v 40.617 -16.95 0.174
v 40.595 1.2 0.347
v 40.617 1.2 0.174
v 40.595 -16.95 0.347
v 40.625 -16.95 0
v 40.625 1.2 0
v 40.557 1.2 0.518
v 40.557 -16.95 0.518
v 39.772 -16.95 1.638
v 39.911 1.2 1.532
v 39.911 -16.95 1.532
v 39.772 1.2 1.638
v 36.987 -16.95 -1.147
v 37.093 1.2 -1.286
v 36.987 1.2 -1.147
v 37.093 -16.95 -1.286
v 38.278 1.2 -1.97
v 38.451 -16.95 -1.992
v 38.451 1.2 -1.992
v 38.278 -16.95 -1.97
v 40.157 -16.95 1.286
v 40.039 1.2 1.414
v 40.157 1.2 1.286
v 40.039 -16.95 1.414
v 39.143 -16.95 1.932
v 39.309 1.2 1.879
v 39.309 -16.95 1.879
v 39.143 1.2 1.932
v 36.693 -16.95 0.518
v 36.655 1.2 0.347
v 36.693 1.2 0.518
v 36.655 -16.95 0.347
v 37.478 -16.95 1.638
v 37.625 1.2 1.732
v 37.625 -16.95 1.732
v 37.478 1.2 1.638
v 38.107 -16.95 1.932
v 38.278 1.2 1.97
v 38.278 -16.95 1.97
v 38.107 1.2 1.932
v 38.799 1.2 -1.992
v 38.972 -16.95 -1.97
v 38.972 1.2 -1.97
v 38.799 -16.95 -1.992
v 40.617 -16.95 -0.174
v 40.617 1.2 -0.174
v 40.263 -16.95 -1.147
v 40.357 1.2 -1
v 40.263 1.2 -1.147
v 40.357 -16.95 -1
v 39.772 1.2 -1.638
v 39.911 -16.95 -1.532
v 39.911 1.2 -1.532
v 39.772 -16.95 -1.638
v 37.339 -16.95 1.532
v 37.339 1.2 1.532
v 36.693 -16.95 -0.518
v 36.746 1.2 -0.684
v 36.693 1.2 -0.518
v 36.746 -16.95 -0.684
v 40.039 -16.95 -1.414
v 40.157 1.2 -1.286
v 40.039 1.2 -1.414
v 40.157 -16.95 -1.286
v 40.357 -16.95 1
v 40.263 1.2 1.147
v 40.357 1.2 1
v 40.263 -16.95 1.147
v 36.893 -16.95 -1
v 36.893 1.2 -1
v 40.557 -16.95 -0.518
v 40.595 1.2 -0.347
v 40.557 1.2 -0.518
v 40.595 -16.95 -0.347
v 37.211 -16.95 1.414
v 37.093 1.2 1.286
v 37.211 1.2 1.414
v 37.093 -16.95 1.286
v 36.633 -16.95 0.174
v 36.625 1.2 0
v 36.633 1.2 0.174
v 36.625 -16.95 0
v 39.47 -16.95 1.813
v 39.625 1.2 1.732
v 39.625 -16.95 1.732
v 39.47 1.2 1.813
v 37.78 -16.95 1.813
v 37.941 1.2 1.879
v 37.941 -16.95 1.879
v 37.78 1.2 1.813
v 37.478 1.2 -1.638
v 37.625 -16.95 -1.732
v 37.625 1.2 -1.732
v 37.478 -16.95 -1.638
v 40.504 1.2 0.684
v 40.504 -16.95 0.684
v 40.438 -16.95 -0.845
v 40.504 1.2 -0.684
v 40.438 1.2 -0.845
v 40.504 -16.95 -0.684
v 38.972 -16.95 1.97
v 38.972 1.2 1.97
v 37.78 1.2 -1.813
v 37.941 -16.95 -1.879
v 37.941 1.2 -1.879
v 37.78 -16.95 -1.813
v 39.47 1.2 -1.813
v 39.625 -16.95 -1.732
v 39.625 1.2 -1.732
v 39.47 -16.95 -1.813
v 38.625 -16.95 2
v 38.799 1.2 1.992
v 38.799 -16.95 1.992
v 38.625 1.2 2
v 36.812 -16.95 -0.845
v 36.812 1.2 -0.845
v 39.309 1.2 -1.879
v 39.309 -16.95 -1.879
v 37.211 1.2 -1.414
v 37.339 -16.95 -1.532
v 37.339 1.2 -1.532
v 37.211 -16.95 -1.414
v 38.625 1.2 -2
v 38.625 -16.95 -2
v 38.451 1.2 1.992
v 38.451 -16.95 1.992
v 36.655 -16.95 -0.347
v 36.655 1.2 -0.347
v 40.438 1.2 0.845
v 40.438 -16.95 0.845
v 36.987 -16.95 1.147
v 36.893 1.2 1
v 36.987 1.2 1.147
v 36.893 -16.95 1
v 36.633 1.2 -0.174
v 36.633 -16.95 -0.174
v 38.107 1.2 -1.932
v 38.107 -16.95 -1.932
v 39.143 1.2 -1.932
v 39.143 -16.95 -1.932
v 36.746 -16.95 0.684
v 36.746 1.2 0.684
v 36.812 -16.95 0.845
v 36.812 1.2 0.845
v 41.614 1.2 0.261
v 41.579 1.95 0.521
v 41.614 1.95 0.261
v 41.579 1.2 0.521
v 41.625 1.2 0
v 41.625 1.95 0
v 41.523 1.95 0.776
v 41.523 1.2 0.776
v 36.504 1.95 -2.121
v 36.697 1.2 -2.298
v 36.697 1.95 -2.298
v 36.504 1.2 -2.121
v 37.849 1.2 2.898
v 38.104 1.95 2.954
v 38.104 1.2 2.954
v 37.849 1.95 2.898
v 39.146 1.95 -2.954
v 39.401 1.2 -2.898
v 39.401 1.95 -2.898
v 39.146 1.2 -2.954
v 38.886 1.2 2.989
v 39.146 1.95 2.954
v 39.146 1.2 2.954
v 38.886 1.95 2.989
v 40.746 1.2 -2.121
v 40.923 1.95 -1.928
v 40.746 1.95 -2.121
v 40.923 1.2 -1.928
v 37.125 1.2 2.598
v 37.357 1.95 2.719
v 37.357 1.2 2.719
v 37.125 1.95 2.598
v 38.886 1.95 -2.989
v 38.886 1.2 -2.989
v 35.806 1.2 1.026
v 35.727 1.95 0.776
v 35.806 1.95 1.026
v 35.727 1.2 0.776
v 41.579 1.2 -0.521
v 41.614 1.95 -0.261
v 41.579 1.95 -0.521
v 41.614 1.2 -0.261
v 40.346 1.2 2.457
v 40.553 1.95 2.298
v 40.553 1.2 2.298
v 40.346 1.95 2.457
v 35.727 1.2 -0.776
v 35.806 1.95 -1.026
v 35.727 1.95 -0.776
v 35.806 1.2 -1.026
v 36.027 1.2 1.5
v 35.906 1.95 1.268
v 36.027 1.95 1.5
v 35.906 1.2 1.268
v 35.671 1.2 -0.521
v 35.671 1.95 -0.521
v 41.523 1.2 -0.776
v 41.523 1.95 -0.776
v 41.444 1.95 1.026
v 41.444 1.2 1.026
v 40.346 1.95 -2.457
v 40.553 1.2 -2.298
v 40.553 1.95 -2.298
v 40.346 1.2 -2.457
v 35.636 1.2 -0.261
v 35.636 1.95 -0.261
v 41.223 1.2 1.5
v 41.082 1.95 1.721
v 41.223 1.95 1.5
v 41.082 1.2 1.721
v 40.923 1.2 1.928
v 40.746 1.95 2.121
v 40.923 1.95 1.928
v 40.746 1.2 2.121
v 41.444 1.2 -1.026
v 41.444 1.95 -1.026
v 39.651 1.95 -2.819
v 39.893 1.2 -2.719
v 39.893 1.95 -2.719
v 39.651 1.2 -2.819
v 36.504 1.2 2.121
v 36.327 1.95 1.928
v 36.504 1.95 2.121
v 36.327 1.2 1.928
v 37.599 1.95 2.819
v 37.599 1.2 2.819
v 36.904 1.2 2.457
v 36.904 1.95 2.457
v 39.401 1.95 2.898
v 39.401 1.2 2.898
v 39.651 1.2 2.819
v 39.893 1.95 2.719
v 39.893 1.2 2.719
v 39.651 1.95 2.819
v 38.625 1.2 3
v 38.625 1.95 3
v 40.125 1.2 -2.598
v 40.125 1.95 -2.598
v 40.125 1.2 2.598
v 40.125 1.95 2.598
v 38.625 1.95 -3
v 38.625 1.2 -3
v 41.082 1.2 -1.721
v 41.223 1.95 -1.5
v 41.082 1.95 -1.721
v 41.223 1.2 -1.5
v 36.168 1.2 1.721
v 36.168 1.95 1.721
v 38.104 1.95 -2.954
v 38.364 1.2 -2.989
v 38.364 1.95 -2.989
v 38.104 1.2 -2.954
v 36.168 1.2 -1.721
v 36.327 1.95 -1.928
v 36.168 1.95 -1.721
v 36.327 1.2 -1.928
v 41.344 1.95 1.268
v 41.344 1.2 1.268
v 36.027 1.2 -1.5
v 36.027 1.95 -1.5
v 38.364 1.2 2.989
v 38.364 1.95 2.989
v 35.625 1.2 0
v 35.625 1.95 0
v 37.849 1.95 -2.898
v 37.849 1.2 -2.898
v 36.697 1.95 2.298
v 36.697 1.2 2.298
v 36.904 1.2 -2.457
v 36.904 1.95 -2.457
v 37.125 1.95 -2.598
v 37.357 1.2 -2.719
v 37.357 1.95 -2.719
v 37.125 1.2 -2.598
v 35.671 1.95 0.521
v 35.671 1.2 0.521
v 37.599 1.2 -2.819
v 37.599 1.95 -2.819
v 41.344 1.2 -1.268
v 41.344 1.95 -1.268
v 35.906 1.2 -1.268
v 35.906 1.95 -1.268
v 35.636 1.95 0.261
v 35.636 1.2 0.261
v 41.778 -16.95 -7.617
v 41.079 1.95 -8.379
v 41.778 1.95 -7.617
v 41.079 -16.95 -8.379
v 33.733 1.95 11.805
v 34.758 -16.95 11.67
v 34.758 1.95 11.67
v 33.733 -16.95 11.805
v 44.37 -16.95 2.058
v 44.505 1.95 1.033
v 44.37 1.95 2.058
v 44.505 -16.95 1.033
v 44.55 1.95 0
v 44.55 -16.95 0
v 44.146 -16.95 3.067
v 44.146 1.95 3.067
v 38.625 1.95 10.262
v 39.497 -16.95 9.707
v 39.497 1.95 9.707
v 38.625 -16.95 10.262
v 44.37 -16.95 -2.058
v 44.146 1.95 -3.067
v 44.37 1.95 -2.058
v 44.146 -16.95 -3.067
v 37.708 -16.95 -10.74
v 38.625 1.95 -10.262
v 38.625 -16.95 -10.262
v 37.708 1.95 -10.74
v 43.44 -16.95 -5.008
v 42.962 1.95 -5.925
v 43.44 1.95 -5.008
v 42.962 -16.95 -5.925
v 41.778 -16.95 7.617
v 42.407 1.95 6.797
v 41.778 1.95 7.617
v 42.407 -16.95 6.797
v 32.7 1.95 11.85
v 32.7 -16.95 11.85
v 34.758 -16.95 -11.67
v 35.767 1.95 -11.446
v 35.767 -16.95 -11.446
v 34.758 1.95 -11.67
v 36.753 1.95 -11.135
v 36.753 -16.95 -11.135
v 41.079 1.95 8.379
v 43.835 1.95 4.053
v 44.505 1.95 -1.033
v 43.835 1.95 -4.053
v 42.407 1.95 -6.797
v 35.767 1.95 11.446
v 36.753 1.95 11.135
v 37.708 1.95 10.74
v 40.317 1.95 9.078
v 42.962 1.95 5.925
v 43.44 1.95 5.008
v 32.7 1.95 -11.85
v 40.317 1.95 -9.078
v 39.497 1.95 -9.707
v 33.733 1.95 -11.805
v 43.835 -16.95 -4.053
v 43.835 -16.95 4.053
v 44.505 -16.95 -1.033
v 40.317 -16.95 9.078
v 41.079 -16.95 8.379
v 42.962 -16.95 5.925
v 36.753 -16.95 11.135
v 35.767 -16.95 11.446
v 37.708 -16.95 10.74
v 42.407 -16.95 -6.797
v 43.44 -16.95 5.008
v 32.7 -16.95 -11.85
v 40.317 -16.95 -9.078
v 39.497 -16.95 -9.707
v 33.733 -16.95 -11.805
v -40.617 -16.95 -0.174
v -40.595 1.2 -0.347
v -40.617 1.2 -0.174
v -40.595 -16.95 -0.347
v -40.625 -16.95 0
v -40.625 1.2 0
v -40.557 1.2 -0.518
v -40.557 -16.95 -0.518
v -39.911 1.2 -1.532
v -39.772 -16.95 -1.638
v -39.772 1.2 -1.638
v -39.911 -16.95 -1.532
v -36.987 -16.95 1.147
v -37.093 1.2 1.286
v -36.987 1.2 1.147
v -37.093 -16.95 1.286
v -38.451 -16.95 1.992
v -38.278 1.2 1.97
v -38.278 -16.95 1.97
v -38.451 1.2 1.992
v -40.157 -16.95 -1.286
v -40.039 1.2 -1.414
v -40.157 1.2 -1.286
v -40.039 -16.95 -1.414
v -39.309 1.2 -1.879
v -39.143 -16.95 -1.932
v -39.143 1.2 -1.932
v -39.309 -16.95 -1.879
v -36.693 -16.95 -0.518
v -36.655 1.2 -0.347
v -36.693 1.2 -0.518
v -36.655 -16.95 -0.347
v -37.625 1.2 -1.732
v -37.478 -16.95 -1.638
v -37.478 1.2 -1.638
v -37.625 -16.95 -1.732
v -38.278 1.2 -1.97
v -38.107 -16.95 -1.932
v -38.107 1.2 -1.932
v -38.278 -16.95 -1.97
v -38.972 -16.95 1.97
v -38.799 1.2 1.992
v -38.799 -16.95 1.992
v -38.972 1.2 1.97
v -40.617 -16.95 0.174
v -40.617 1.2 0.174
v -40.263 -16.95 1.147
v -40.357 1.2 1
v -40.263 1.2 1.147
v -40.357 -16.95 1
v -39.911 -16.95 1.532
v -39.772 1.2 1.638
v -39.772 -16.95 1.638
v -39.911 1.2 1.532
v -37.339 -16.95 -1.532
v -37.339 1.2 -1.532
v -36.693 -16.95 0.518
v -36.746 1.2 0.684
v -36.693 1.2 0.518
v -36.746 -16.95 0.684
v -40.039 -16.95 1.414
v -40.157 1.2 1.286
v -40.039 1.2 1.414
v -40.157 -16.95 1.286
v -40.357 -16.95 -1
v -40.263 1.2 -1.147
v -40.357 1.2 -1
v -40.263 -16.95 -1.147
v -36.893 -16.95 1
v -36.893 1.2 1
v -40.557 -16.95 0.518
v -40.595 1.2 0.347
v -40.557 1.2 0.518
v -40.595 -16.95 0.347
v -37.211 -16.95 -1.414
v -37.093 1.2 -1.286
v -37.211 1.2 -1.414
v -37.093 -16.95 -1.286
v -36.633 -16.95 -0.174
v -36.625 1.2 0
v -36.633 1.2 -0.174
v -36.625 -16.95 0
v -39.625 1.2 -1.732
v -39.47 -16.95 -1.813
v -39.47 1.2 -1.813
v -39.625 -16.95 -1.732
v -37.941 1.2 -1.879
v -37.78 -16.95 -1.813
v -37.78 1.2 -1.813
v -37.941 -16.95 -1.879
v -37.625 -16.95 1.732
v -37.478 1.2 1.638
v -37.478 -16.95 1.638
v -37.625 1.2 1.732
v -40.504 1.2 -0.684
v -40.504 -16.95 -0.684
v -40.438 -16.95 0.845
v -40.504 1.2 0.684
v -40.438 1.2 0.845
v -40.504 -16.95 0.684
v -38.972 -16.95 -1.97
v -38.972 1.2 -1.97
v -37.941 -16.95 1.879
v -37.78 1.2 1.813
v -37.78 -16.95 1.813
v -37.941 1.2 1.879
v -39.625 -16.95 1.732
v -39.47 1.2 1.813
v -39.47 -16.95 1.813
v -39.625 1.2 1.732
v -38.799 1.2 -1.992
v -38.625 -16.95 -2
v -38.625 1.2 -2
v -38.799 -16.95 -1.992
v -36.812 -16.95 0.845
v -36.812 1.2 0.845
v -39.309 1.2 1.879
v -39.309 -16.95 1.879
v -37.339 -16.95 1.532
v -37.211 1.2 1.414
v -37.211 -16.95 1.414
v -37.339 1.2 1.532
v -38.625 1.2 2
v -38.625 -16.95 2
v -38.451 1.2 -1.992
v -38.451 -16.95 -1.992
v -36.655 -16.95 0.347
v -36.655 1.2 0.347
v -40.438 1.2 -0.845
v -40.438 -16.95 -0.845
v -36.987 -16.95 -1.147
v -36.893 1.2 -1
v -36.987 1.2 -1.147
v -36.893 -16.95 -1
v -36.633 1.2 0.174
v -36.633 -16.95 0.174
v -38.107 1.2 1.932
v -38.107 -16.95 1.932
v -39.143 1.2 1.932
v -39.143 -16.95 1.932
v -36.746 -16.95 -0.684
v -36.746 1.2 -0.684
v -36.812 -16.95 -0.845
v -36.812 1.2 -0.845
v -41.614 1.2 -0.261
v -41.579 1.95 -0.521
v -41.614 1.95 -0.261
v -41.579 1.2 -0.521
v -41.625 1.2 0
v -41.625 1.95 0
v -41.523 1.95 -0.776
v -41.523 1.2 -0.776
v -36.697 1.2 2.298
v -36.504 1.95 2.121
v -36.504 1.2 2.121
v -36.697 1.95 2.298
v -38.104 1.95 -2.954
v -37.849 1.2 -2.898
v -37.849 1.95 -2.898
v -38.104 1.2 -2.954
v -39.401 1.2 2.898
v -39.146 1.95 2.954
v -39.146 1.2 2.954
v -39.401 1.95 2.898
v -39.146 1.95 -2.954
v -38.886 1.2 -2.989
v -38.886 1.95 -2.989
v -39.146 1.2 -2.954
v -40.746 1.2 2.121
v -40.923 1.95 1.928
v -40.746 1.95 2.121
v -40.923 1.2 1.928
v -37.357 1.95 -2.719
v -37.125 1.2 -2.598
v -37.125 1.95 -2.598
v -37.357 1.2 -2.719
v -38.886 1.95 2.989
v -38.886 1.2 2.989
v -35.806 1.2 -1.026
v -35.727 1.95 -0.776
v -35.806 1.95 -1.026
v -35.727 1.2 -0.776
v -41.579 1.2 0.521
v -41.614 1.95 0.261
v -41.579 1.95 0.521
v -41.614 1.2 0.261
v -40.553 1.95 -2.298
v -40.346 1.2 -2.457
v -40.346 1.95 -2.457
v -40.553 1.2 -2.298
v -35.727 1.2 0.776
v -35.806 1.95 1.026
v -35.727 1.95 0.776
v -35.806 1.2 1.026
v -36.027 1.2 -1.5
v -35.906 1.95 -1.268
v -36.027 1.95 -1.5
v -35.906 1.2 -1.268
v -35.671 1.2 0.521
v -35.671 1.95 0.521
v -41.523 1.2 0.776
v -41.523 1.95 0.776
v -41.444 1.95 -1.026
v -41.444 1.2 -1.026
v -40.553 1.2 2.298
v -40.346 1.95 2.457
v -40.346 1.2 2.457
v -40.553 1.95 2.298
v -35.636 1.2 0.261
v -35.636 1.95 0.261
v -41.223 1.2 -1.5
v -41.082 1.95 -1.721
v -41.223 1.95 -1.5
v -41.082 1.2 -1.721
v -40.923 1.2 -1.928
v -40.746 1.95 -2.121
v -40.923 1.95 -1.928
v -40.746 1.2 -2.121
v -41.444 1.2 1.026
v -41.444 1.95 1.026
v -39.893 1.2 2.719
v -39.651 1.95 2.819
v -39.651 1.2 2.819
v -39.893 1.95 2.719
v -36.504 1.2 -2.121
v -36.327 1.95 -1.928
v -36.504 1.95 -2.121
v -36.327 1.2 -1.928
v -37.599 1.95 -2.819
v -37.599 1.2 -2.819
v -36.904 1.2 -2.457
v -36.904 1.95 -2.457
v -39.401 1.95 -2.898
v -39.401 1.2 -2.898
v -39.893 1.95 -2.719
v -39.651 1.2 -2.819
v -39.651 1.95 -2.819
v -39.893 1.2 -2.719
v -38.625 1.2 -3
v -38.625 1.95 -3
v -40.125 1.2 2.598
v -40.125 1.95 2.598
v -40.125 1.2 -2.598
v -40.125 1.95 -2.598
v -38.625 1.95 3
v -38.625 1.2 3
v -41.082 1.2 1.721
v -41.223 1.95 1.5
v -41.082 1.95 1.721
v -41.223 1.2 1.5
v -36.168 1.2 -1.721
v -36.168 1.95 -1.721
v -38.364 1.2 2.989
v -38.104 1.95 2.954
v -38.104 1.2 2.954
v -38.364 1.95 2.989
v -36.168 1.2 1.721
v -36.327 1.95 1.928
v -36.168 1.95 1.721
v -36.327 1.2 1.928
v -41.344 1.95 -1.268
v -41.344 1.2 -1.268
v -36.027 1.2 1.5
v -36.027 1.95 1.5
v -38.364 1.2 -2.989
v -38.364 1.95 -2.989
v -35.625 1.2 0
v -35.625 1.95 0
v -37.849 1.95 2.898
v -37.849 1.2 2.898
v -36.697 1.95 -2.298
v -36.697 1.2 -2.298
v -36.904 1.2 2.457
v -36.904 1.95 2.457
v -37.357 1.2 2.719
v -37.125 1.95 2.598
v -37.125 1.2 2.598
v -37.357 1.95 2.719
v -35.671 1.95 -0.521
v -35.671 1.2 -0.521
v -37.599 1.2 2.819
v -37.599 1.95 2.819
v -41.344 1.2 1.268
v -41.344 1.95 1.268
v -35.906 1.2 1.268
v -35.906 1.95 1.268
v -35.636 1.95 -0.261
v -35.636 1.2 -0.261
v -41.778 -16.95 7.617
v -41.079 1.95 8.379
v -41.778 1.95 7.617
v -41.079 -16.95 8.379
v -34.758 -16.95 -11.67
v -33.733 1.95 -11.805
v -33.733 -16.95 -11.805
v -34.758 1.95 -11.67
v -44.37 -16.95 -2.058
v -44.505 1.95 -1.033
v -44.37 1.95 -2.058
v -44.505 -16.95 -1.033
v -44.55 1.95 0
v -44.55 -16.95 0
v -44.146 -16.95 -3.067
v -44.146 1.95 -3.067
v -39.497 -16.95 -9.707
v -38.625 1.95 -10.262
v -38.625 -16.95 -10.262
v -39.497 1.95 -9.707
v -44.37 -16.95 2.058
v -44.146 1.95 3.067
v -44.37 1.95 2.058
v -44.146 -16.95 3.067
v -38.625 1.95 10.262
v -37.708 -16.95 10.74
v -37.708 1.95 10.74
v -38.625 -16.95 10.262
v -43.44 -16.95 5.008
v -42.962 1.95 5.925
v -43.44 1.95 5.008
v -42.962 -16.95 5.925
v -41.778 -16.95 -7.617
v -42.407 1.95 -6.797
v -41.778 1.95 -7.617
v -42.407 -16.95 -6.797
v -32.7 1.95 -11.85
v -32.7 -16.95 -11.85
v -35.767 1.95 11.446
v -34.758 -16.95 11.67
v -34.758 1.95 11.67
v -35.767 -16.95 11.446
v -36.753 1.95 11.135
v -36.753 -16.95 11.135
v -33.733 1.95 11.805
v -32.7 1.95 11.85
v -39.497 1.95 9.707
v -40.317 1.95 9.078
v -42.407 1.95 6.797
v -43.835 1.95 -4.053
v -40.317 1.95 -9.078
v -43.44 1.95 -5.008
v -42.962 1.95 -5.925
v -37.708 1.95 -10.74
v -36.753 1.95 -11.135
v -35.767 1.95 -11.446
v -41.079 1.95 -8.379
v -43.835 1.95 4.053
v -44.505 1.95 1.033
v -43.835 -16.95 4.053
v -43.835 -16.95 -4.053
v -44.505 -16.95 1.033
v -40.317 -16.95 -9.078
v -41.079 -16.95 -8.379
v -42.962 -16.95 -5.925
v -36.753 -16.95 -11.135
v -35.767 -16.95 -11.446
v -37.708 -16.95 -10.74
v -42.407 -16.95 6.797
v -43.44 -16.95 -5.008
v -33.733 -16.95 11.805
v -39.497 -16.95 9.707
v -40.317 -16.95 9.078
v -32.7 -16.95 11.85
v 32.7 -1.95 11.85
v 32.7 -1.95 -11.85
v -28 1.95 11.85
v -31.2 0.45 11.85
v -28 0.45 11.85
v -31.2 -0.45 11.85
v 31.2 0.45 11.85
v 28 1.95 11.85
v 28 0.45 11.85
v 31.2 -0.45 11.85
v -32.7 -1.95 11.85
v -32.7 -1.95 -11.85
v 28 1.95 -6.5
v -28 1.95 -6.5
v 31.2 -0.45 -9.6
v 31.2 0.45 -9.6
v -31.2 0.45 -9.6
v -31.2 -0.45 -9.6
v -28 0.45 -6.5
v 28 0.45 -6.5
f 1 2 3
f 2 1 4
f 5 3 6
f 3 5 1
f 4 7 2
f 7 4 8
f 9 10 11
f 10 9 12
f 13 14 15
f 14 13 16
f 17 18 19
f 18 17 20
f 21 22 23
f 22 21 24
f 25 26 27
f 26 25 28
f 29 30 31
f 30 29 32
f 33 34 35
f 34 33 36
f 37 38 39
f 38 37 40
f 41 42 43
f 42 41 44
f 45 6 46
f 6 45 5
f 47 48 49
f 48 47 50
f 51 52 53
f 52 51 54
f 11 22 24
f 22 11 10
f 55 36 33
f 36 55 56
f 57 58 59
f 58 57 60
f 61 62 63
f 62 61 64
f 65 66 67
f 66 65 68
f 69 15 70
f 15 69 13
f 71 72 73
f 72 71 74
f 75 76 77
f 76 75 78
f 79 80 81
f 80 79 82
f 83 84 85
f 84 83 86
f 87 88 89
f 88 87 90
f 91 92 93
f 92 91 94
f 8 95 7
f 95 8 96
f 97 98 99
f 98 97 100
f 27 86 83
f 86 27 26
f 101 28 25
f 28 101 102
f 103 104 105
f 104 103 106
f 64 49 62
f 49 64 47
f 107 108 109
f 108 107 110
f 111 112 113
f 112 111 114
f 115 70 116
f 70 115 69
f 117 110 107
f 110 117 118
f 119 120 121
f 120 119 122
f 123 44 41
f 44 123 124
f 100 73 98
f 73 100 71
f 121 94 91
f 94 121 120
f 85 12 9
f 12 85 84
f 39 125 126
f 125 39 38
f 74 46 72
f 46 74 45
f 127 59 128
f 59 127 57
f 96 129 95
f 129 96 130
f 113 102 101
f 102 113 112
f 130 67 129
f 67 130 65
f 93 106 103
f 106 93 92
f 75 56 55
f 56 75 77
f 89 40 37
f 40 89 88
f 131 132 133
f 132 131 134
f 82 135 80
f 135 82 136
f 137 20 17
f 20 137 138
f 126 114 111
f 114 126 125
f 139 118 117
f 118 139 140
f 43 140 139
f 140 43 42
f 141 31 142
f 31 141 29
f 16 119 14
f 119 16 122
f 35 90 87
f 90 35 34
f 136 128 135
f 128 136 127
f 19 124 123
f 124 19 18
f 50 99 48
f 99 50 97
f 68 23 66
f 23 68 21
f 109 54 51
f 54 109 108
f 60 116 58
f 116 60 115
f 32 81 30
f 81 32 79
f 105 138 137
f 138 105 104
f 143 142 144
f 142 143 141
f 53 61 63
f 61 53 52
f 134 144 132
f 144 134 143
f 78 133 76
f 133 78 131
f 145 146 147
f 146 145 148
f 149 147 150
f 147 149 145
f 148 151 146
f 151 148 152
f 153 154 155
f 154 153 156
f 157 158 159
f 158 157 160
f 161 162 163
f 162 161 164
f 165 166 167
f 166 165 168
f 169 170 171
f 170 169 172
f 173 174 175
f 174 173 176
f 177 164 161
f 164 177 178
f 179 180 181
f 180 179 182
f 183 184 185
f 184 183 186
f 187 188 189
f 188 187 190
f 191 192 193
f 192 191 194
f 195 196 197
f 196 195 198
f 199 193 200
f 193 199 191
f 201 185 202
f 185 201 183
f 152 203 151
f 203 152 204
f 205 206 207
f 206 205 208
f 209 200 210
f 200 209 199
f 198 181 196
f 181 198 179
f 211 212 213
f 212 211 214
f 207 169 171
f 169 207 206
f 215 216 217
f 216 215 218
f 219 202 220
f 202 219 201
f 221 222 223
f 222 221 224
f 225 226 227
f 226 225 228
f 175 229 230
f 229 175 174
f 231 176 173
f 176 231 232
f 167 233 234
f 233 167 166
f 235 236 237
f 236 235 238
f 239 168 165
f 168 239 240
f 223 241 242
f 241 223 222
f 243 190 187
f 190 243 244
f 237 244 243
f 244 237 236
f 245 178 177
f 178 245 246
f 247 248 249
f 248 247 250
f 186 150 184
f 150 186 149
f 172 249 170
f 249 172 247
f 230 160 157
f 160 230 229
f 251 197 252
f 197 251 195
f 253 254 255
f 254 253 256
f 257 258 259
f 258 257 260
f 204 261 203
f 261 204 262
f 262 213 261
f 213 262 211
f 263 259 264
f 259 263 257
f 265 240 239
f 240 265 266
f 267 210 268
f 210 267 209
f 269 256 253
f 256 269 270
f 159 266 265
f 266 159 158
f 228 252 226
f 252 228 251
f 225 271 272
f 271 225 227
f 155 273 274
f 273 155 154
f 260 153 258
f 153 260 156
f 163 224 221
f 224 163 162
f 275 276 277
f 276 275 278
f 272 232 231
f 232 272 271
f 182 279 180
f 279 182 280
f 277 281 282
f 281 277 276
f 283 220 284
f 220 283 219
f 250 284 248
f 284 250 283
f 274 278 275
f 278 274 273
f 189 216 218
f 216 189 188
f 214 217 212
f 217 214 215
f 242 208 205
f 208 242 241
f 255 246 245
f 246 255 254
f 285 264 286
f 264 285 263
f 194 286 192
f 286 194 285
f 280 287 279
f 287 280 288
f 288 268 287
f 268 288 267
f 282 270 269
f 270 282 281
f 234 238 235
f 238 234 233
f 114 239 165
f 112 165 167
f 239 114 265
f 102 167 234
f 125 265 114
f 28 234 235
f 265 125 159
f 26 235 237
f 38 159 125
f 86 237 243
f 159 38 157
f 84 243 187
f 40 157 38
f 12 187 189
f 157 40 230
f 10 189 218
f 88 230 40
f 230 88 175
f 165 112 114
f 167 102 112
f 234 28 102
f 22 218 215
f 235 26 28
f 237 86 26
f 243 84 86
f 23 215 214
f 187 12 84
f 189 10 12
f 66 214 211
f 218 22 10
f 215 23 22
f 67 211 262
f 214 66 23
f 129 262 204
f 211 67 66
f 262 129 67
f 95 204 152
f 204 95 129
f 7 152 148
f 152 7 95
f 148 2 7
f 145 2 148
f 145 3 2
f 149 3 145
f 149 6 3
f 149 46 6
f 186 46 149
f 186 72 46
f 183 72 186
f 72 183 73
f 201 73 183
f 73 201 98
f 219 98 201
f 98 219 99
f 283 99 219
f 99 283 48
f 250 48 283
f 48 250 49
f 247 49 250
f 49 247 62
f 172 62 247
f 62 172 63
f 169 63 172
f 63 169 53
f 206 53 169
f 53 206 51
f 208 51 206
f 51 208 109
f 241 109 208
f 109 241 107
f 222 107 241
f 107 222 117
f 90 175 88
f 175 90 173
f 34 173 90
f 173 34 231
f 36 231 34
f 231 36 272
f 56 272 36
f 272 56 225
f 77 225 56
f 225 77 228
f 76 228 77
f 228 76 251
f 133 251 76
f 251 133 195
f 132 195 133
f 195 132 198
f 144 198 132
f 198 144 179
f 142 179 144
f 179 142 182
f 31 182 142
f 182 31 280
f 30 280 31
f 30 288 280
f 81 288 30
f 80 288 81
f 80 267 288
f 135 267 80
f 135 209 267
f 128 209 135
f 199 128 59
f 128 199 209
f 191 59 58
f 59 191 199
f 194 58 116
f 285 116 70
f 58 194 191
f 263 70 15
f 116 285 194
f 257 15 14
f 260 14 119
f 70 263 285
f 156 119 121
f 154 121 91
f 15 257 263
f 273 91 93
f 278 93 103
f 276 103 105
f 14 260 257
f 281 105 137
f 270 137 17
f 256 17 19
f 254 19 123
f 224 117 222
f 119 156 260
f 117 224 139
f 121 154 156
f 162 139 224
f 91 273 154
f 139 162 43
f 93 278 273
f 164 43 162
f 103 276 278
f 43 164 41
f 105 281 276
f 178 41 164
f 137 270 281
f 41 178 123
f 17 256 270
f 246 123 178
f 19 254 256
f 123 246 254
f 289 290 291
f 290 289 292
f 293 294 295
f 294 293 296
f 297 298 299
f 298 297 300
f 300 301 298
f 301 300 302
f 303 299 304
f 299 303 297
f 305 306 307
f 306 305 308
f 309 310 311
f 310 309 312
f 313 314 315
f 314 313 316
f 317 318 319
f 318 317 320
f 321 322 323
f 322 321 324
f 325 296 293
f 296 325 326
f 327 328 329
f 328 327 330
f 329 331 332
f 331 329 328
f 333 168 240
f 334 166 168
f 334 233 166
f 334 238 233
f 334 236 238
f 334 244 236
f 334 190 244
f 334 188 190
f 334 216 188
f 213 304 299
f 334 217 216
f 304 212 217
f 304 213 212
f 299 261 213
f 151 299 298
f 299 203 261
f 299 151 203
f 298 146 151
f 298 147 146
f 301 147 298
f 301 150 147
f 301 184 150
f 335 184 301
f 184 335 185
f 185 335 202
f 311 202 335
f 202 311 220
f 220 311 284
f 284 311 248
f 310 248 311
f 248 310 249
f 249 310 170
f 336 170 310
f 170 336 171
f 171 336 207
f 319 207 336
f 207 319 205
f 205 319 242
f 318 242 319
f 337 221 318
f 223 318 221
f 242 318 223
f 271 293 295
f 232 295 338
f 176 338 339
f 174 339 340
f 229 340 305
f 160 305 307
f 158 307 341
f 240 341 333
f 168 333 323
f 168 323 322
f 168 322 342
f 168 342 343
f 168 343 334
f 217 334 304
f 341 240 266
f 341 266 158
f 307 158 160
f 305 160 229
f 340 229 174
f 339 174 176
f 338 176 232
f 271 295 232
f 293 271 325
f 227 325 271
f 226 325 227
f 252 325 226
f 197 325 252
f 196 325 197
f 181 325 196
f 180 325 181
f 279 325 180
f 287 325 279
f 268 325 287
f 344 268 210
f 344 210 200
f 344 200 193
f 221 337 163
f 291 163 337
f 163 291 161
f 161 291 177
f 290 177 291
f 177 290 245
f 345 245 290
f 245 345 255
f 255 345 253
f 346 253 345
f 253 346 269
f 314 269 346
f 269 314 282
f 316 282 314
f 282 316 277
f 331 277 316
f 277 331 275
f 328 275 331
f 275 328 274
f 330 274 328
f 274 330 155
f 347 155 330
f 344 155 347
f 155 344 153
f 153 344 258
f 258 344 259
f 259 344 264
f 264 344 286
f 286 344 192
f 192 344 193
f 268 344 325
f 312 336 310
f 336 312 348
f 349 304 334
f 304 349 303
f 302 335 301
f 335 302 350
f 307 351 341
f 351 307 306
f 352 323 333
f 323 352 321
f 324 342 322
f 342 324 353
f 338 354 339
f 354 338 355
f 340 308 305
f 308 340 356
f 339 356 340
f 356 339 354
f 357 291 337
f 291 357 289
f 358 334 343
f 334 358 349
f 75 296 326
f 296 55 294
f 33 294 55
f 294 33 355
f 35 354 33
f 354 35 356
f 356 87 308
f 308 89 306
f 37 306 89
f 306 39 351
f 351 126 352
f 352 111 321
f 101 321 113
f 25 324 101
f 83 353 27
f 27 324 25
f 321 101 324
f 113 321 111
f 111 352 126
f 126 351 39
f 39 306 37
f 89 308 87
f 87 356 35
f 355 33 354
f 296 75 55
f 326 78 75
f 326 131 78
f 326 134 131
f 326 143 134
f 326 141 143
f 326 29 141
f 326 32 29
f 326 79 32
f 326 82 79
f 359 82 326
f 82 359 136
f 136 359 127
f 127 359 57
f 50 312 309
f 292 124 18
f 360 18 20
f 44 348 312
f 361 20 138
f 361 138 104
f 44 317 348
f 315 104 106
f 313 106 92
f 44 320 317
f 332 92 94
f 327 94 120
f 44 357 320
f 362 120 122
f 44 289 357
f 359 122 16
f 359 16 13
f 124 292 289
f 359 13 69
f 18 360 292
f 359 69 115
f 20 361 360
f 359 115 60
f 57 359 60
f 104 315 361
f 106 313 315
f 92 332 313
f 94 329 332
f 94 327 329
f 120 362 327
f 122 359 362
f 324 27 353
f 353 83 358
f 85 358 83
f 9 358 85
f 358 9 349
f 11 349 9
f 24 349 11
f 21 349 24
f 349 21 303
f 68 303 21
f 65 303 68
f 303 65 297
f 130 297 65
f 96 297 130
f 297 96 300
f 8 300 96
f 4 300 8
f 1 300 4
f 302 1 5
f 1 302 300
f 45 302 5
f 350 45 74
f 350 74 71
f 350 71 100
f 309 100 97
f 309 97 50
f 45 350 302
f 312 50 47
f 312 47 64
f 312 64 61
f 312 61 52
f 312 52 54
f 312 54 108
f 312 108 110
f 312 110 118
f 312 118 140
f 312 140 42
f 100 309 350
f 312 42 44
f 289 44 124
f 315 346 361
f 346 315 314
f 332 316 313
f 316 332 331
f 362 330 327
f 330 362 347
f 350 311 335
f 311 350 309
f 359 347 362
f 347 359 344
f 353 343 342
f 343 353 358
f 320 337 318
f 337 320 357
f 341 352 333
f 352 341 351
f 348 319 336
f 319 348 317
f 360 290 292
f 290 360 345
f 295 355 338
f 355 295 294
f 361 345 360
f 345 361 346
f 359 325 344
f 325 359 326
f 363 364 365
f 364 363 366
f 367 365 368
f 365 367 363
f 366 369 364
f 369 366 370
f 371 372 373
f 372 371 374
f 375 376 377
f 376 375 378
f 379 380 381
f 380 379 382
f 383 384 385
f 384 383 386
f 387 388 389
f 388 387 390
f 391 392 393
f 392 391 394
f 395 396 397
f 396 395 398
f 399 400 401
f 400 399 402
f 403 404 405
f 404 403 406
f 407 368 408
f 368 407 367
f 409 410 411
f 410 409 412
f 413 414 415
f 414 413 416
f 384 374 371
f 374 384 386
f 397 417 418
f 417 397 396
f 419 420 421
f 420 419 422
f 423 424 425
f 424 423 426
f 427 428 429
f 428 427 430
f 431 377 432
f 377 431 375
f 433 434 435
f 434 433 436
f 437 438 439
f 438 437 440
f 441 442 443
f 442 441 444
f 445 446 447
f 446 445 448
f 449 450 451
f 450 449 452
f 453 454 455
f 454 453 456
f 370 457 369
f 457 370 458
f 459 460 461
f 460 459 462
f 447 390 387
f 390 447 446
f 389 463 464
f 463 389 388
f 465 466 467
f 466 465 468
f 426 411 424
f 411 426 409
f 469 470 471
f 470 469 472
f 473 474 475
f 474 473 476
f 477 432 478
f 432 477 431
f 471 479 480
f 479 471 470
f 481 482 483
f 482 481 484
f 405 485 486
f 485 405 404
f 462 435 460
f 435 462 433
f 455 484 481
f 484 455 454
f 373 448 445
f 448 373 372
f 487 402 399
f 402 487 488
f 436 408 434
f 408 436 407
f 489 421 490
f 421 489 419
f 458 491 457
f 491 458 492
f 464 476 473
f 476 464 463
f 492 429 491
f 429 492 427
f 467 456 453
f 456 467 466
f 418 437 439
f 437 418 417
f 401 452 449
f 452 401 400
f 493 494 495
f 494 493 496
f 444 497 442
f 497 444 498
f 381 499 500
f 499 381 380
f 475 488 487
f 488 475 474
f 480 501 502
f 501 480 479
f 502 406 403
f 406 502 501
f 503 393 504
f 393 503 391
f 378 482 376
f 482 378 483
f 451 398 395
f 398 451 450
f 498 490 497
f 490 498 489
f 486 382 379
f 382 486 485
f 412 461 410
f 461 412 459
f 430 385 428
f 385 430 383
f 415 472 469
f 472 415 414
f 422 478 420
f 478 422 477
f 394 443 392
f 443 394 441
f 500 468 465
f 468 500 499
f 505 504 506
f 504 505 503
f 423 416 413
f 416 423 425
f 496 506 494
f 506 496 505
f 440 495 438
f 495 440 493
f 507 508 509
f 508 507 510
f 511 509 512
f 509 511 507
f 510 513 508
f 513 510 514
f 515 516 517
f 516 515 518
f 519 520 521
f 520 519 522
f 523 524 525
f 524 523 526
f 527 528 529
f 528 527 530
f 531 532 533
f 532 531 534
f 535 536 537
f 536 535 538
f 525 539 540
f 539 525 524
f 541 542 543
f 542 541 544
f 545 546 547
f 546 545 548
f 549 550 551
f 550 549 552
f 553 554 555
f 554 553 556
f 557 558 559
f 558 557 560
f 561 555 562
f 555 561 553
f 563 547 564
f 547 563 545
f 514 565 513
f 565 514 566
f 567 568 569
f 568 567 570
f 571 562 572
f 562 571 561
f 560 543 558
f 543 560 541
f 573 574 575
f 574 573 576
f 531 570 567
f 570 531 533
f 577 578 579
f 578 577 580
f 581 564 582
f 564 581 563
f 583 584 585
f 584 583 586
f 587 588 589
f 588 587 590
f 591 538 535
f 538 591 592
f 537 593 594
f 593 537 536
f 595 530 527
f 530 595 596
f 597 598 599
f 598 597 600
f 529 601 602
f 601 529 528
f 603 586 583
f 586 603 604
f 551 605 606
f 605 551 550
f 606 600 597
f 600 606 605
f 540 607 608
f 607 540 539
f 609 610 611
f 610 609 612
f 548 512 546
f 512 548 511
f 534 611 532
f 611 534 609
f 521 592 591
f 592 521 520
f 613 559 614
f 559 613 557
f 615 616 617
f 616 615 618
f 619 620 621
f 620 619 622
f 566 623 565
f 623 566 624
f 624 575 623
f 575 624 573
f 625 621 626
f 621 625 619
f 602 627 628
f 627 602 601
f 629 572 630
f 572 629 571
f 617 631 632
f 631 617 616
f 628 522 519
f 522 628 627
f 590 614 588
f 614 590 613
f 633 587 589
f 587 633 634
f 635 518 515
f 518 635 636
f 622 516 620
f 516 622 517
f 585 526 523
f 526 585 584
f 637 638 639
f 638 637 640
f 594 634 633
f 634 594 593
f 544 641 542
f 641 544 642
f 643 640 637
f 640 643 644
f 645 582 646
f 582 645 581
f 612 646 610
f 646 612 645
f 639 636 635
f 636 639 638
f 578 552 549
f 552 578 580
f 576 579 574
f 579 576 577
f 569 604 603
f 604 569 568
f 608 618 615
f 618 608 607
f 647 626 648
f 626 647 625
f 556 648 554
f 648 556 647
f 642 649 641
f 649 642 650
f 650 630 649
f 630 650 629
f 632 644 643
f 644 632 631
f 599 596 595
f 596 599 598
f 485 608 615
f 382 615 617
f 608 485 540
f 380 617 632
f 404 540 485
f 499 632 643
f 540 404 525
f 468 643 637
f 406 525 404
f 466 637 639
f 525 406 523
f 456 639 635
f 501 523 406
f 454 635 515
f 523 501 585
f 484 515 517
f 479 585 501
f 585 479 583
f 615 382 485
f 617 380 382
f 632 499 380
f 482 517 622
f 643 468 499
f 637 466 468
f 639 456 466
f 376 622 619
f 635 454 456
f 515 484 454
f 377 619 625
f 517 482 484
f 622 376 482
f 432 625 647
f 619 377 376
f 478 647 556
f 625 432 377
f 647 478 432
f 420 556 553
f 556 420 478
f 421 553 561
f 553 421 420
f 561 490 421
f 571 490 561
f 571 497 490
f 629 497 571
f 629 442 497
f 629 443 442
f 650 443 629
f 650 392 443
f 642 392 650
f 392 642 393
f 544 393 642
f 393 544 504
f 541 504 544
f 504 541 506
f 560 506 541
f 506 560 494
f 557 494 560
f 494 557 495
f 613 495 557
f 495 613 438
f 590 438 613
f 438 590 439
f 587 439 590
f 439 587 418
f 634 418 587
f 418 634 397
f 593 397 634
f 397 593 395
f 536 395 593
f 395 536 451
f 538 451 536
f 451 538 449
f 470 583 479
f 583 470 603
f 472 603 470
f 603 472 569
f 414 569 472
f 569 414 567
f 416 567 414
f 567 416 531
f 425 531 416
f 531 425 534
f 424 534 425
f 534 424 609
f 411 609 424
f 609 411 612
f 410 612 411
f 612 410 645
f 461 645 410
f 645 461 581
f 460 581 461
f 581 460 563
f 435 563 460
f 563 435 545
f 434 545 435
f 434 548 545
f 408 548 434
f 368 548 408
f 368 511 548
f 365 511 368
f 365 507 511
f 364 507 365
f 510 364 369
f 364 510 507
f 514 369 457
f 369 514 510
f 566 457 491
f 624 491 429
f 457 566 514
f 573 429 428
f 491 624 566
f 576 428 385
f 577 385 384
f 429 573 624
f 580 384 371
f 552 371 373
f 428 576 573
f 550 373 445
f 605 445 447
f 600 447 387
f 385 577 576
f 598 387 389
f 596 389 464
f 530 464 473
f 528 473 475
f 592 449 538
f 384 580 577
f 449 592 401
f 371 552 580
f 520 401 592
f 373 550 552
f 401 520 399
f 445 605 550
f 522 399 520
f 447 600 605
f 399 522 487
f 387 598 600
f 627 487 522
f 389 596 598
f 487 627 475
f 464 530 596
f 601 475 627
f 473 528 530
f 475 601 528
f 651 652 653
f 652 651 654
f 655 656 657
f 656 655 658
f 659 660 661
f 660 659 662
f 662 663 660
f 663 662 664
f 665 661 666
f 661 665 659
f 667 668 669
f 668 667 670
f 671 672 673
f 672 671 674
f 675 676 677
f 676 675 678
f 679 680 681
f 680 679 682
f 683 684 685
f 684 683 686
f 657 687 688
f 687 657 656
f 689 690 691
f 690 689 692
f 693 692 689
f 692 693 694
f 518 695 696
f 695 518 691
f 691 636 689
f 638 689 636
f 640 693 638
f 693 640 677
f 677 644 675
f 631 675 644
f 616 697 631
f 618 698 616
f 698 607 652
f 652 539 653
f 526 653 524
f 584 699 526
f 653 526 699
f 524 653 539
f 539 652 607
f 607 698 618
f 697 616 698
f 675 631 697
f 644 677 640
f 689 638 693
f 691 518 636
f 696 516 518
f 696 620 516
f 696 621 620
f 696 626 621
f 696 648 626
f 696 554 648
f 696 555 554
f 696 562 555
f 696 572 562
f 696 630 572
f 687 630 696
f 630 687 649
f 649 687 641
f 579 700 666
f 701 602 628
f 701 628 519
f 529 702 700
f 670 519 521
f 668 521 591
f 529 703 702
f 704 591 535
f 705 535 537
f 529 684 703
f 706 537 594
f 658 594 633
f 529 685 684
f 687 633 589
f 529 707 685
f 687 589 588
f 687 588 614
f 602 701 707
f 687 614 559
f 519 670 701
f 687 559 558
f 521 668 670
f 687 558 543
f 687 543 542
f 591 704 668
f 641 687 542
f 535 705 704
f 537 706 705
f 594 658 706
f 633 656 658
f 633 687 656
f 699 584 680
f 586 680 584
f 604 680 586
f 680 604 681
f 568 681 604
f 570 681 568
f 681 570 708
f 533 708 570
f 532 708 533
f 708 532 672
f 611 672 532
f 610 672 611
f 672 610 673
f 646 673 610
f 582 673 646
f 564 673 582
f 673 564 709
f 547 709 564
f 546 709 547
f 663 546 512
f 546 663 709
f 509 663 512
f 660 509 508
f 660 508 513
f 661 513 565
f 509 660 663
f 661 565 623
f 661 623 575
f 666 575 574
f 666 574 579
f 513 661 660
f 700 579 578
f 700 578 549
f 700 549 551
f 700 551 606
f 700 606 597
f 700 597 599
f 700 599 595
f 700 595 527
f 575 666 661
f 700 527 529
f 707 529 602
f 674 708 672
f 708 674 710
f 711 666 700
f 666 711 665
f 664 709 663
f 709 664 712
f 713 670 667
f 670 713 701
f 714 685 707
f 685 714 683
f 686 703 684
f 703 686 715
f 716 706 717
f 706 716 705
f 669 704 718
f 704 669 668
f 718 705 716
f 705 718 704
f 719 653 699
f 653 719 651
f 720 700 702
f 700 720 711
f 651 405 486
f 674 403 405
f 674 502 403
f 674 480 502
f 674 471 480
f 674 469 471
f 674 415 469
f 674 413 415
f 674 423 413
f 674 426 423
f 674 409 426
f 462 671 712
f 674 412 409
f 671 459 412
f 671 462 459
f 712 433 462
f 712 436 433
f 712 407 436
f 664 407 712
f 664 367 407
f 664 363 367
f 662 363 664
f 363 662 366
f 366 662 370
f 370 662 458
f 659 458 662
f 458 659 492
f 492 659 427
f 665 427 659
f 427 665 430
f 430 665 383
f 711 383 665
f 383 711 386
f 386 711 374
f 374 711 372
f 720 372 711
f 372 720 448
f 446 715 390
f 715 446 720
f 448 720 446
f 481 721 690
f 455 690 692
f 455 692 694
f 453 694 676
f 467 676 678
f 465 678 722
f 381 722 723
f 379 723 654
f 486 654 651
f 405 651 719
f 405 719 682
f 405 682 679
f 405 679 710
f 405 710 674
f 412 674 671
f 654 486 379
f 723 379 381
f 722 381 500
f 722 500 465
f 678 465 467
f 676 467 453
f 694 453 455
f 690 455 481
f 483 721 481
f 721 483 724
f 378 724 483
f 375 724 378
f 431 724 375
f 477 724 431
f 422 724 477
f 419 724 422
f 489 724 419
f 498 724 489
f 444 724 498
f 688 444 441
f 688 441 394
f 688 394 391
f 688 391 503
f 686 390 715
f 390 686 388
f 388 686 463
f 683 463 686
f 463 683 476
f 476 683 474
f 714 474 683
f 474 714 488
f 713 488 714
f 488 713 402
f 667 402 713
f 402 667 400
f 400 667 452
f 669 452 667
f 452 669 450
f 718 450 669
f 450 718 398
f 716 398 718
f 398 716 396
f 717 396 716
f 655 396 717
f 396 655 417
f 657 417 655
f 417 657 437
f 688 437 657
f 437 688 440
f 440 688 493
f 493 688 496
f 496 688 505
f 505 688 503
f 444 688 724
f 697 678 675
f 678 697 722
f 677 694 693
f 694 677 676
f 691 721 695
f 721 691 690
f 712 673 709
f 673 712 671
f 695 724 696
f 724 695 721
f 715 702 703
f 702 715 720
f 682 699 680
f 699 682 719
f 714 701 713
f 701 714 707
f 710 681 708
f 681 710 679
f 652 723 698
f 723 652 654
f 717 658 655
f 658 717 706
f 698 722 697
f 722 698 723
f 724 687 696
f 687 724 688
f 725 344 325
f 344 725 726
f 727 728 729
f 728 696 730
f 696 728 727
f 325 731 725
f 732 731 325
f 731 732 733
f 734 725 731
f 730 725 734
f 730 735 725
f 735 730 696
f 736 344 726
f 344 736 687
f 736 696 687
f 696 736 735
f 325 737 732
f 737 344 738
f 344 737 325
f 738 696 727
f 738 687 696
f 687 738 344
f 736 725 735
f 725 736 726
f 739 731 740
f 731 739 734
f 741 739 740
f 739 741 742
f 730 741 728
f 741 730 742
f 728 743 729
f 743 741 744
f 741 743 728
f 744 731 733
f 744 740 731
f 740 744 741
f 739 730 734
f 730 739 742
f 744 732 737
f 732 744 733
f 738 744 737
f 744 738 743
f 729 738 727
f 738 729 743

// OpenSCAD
//
// Parametric Label Holder for Drawers and Cupboards
//
// The label holder can be configured for different paper label
// sizes. It can be made as a glue-on holder using the whole of
// its back or only a part of it for attaching a double-sided
// adhesive tape, or it can be made as a screw-on holder, either
// using flat-headed screws or conical-headed screws (eg. SPAX).
//
// Remarks:
//
// Example parameters for Leitz 1900/1901 labels:
//  - LabelWidth     = 62;
//  - LabelHeight    = 22;
//  - LabelThickness = 0.5;
//
// Choose the label thickness so that the label sits firmly but
// the printer can manage to keep front and back apart.
//
// Choose the wall thickness so that it is a multiple of your
// printer's nozzle width (most printers use 0.4mm nozzles).
//
// When using screw mounts, choose a wall-thickness that adds
// to the stability (especially when using a power screwdriver
// to mount the label holders).
//
// Print upright with ground supports.
// Print with supports when printing a screw-on holder.
//
// TODO:
//   - Option to have a top frame (requires print with supports)
//     Might add a nice look to the whole thing
//   - Bug fixes (yes, there still may be some of those critters)
//   - Option for "clip-on" label holders (eg. heavy-duty racks)
//   - Round front edges on all designs for smoother look
//   - Smoothen egdes on label window
//   - Optional: Make label window a trapezoid
//
/* [Main Dimensions] */
// Width of paper label (mm)
LabelWidth     = 62;    
// Height of paper label (mm)
LabelHeight    = 22;    
// Thickness of paper label (mm)
LabelThickness = 0.5;    
// Thickness of label holder walls (mm)
WallThickness  = 1.5;     
// The following are optional configurational parameters.
// You will probably not have to change those.
// Width of window frame
FrameBorder    = 3.0;       
// Extra padding for paper label
Padding        = 0.2;       
// Are we using screws to mount it ?
UseScrews      = 1; // [0:false, 1:true]

/* [Screws version] */
// Space behind to use it as a handle (mm)
SpacerHeight  = 15;   // [0:50]    
// Are you using flat head screws (false for conical)?
FlatheadScrew  = 1; // [0:false, 1:true]
// Diameter of screws? (mm)
ScrewDiameter  = 4.0;
// Diameter of screw heads ? (mm)
HeadDiameter   = 6.0;
// Head height for conical screw heads (mm)
HeadHeight     = 2.0;       // for conical screw heads

/* [NO Screws version] */
// For thicker double-sided tape and/or tape that cannot cover the
// total height of the label holder, it might be nice to cut out a
// small rail in the back for the tape...
// Width of double-sided tape (mm)
TapeWidth      = 25.0;      
// Thickness of double-sided tape (mm)
TapeThickness  = 0.0;       


/* [Hidden] */
// Private Data
// Don't change anything below here except you're me!
OuterBoxWidth     = WallThickness * 2.0 + Padding * 2.0 + LabelWidth;
OuterBoxHeight    = WallThickness + Padding + LabelHeight;
OuterBoxThickness = WallThickness * 2.0 + Padding * 2.0 + LabelThickness;

// for smooth geometry...
$fs = 0.1;
$fa = 5;


module screw_head() {       // seating for a screw (if any)
    if( FlatheadScrew ) {
        translate( [ 0, 0, -(OuterBoxThickness / 2.0) ] )
            cylinder( WallThickness, 
                      d = HeadDiameter, 
                      center = true );
    } else {
        translate( [ 0, 0, -(OuterBoxThickness - HeadHeight) ] )
            cylinder( HeadHeight,
                      d1 = HeadDiameter, 
                      d2 = ScrewDiameter,
                      center = true );
    }
}


module screw_hole() {       // channel for a screw to fit through (if any)
    translate( [ OuterBoxHeight / 4.0, 0, 0 ] )
        union () {
            cylinder( OuterBoxThickness+(2*SpacerHeight+2.0), 
                      d = ScrewDiameter, 
                      center = true );
            screw_head();
        }
}


module screw_mount() {      // half-cylinder with hole for screw-on
    rotate( [ 90, 0, 0 ] )  // mounting (if any)
        difference() {                      // There's no need to cut off
            translate([0,0,SpacerHeight/2])cylinder( OuterBoxThickness+SpacerHeight,  // half of the cylinder since
                      d = OuterBoxHeight,   // the extra will be removed
                      center = true );      // by the label and window
            translate([-OuterBoxHeight/2,0,SpacerHeight/2])
                cube(size=[OuterBoxHeight,OuterBoxHeight,OuterBoxThickness+SpacerHeight+2.0],   // the extra will be removed
                      center = true );      // by the label and window
            screw_hole();                   // boxes...
        }
}


module screw_mounts() {     // place screw mount plates on both sides
    if( UseScrews ) {       // (if any screws used)
        SideOffset = LabelWidth / 2.0 + WallThickness + Padding;
        translate( [ SideOffset, 0, 0 ] )
            screw_mount();
        translate( [ -SideOffset, 0, 0 ] )
            rotate( [ 0, 180, 0 ] )
                screw_mount();
    }
}


module label_box() {        // space where the paper label slides in
    //
    // TODO:
    //   - Check formulas for bugs as this looks a bit as if there
    //     may be some (translate)...
    //
    translate( [ 0, 
                 0, 
                 WallThickness ] )
        cube( [ Padding * 2.0 + LabelWidth,
                Padding * 2.0 + LabelThickness,
                Padding + LabelHeight ], center = true );
}


module label_window() {     // front bezel - what is visible of the
    //                      // paper label
    // TODO:
    //   - Add option for having a top frame
    //   - Check formulas for bugs as this looks a bit as if there
    //     may be some (tanslate, cube)...
    //
    translate( [ 0, 
                 WallThickness / 2.0 + Padding + LabelThickness / 2.0, 
                 WallThickness + FrameBorder / 2 ] )
        cube( [ LabelWidth - FrameBorder * 2.0,
                WallThickness + Padding,
                LabelHeight - FrameBorder ], center = true );
}


module tape_rail() {        // when using glue-on method, this is where
    if( !UseScrews &&       // the double-sided adhesive tape is placed
        (TapeThickness > 0) &&
        (TapeWidth > 0) && (TapeWidth < OuterBoxHeight) ) {
        BackOffset = (WallThickness + Padding + LabelThickness / 2.0) - (TapeThickness / 2.0);
        translate( [ 0, -BackOffset, 0 ] )
            cube( [ OuterBoxWidth,
                    TapeThickness,
                    TapeWidth ], center = true );
    }
}


difference() {              // main body
    union() {
        // outer box
        cube( [ OuterBoxWidth,
                OuterBoxThickness,
                OuterBoxHeight ], center = true );
        screw_mounts();
    }
    union() {
        label_box();
        label_window();
        tape_rail();
    }
}
